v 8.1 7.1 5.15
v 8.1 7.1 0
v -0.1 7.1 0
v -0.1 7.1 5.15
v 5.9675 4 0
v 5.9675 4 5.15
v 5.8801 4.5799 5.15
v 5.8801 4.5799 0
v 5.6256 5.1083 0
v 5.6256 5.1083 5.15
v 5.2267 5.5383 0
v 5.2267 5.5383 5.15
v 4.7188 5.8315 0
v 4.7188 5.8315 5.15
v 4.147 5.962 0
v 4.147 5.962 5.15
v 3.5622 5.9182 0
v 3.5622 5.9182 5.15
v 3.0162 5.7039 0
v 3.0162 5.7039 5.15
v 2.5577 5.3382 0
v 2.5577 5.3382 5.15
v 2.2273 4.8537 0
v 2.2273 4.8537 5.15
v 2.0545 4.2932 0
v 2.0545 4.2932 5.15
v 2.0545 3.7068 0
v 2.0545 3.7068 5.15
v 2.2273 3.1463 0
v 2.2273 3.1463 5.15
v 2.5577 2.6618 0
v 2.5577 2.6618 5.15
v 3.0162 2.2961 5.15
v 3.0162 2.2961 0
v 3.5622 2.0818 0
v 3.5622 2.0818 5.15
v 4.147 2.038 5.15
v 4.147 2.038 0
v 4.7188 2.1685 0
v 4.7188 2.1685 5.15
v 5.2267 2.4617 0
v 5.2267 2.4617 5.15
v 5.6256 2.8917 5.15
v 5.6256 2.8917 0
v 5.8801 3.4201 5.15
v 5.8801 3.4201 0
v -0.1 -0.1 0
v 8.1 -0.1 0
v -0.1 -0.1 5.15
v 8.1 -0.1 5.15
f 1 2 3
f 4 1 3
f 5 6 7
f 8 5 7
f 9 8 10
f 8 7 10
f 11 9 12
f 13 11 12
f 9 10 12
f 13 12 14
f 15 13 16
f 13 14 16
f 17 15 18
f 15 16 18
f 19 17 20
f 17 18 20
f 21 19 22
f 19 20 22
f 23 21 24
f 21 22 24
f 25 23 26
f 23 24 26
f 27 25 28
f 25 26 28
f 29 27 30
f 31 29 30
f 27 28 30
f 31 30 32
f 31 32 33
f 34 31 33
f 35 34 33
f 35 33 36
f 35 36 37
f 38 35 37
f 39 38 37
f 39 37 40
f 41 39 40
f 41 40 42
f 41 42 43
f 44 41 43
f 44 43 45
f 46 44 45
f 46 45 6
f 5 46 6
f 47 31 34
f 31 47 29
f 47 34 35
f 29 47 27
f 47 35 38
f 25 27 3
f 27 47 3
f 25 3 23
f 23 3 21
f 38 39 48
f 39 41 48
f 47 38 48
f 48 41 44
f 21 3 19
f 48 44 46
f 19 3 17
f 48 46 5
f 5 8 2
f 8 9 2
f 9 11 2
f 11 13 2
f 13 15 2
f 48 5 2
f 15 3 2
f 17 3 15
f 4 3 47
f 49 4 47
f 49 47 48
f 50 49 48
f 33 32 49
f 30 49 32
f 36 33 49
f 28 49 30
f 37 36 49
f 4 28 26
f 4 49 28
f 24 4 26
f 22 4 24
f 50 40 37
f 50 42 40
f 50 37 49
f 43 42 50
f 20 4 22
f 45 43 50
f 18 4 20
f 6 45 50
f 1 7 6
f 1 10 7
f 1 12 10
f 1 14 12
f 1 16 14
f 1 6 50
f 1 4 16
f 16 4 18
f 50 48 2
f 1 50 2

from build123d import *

# Parameters (mm, degrees)
BOSS_EXTRUDE1_DEPTH = 5.15
SKETCH2_R           = 1.9675
CUT_EXTRUDE1_DEPTH  = 6.15


with BuildPart() as part:
    # Sketch1 → Boss-Extrude1 (new body)
    with BuildSketch(Plane.XY):
        Polygon((-0.1, -0.1), (3, -0.1), (7, -0.1), (8.1, -0.1), (8.1, 7.1), (-0.1, 7.1), align=None)
    extrude(amount=BOSS_EXTRUDE1_DEPTH)

    # Sketch2 → Cut-Extrude1 (cut, through all)
    with BuildSketch(Plane.XY.offset(5.15)):
        with Locations((4, 4)):
            Circle(SKETCH2_R)
    extrude(amount=-CUT_EXTRUDE1_DEPTH, mode=Mode.SUBTRACT)


solid = part.part
